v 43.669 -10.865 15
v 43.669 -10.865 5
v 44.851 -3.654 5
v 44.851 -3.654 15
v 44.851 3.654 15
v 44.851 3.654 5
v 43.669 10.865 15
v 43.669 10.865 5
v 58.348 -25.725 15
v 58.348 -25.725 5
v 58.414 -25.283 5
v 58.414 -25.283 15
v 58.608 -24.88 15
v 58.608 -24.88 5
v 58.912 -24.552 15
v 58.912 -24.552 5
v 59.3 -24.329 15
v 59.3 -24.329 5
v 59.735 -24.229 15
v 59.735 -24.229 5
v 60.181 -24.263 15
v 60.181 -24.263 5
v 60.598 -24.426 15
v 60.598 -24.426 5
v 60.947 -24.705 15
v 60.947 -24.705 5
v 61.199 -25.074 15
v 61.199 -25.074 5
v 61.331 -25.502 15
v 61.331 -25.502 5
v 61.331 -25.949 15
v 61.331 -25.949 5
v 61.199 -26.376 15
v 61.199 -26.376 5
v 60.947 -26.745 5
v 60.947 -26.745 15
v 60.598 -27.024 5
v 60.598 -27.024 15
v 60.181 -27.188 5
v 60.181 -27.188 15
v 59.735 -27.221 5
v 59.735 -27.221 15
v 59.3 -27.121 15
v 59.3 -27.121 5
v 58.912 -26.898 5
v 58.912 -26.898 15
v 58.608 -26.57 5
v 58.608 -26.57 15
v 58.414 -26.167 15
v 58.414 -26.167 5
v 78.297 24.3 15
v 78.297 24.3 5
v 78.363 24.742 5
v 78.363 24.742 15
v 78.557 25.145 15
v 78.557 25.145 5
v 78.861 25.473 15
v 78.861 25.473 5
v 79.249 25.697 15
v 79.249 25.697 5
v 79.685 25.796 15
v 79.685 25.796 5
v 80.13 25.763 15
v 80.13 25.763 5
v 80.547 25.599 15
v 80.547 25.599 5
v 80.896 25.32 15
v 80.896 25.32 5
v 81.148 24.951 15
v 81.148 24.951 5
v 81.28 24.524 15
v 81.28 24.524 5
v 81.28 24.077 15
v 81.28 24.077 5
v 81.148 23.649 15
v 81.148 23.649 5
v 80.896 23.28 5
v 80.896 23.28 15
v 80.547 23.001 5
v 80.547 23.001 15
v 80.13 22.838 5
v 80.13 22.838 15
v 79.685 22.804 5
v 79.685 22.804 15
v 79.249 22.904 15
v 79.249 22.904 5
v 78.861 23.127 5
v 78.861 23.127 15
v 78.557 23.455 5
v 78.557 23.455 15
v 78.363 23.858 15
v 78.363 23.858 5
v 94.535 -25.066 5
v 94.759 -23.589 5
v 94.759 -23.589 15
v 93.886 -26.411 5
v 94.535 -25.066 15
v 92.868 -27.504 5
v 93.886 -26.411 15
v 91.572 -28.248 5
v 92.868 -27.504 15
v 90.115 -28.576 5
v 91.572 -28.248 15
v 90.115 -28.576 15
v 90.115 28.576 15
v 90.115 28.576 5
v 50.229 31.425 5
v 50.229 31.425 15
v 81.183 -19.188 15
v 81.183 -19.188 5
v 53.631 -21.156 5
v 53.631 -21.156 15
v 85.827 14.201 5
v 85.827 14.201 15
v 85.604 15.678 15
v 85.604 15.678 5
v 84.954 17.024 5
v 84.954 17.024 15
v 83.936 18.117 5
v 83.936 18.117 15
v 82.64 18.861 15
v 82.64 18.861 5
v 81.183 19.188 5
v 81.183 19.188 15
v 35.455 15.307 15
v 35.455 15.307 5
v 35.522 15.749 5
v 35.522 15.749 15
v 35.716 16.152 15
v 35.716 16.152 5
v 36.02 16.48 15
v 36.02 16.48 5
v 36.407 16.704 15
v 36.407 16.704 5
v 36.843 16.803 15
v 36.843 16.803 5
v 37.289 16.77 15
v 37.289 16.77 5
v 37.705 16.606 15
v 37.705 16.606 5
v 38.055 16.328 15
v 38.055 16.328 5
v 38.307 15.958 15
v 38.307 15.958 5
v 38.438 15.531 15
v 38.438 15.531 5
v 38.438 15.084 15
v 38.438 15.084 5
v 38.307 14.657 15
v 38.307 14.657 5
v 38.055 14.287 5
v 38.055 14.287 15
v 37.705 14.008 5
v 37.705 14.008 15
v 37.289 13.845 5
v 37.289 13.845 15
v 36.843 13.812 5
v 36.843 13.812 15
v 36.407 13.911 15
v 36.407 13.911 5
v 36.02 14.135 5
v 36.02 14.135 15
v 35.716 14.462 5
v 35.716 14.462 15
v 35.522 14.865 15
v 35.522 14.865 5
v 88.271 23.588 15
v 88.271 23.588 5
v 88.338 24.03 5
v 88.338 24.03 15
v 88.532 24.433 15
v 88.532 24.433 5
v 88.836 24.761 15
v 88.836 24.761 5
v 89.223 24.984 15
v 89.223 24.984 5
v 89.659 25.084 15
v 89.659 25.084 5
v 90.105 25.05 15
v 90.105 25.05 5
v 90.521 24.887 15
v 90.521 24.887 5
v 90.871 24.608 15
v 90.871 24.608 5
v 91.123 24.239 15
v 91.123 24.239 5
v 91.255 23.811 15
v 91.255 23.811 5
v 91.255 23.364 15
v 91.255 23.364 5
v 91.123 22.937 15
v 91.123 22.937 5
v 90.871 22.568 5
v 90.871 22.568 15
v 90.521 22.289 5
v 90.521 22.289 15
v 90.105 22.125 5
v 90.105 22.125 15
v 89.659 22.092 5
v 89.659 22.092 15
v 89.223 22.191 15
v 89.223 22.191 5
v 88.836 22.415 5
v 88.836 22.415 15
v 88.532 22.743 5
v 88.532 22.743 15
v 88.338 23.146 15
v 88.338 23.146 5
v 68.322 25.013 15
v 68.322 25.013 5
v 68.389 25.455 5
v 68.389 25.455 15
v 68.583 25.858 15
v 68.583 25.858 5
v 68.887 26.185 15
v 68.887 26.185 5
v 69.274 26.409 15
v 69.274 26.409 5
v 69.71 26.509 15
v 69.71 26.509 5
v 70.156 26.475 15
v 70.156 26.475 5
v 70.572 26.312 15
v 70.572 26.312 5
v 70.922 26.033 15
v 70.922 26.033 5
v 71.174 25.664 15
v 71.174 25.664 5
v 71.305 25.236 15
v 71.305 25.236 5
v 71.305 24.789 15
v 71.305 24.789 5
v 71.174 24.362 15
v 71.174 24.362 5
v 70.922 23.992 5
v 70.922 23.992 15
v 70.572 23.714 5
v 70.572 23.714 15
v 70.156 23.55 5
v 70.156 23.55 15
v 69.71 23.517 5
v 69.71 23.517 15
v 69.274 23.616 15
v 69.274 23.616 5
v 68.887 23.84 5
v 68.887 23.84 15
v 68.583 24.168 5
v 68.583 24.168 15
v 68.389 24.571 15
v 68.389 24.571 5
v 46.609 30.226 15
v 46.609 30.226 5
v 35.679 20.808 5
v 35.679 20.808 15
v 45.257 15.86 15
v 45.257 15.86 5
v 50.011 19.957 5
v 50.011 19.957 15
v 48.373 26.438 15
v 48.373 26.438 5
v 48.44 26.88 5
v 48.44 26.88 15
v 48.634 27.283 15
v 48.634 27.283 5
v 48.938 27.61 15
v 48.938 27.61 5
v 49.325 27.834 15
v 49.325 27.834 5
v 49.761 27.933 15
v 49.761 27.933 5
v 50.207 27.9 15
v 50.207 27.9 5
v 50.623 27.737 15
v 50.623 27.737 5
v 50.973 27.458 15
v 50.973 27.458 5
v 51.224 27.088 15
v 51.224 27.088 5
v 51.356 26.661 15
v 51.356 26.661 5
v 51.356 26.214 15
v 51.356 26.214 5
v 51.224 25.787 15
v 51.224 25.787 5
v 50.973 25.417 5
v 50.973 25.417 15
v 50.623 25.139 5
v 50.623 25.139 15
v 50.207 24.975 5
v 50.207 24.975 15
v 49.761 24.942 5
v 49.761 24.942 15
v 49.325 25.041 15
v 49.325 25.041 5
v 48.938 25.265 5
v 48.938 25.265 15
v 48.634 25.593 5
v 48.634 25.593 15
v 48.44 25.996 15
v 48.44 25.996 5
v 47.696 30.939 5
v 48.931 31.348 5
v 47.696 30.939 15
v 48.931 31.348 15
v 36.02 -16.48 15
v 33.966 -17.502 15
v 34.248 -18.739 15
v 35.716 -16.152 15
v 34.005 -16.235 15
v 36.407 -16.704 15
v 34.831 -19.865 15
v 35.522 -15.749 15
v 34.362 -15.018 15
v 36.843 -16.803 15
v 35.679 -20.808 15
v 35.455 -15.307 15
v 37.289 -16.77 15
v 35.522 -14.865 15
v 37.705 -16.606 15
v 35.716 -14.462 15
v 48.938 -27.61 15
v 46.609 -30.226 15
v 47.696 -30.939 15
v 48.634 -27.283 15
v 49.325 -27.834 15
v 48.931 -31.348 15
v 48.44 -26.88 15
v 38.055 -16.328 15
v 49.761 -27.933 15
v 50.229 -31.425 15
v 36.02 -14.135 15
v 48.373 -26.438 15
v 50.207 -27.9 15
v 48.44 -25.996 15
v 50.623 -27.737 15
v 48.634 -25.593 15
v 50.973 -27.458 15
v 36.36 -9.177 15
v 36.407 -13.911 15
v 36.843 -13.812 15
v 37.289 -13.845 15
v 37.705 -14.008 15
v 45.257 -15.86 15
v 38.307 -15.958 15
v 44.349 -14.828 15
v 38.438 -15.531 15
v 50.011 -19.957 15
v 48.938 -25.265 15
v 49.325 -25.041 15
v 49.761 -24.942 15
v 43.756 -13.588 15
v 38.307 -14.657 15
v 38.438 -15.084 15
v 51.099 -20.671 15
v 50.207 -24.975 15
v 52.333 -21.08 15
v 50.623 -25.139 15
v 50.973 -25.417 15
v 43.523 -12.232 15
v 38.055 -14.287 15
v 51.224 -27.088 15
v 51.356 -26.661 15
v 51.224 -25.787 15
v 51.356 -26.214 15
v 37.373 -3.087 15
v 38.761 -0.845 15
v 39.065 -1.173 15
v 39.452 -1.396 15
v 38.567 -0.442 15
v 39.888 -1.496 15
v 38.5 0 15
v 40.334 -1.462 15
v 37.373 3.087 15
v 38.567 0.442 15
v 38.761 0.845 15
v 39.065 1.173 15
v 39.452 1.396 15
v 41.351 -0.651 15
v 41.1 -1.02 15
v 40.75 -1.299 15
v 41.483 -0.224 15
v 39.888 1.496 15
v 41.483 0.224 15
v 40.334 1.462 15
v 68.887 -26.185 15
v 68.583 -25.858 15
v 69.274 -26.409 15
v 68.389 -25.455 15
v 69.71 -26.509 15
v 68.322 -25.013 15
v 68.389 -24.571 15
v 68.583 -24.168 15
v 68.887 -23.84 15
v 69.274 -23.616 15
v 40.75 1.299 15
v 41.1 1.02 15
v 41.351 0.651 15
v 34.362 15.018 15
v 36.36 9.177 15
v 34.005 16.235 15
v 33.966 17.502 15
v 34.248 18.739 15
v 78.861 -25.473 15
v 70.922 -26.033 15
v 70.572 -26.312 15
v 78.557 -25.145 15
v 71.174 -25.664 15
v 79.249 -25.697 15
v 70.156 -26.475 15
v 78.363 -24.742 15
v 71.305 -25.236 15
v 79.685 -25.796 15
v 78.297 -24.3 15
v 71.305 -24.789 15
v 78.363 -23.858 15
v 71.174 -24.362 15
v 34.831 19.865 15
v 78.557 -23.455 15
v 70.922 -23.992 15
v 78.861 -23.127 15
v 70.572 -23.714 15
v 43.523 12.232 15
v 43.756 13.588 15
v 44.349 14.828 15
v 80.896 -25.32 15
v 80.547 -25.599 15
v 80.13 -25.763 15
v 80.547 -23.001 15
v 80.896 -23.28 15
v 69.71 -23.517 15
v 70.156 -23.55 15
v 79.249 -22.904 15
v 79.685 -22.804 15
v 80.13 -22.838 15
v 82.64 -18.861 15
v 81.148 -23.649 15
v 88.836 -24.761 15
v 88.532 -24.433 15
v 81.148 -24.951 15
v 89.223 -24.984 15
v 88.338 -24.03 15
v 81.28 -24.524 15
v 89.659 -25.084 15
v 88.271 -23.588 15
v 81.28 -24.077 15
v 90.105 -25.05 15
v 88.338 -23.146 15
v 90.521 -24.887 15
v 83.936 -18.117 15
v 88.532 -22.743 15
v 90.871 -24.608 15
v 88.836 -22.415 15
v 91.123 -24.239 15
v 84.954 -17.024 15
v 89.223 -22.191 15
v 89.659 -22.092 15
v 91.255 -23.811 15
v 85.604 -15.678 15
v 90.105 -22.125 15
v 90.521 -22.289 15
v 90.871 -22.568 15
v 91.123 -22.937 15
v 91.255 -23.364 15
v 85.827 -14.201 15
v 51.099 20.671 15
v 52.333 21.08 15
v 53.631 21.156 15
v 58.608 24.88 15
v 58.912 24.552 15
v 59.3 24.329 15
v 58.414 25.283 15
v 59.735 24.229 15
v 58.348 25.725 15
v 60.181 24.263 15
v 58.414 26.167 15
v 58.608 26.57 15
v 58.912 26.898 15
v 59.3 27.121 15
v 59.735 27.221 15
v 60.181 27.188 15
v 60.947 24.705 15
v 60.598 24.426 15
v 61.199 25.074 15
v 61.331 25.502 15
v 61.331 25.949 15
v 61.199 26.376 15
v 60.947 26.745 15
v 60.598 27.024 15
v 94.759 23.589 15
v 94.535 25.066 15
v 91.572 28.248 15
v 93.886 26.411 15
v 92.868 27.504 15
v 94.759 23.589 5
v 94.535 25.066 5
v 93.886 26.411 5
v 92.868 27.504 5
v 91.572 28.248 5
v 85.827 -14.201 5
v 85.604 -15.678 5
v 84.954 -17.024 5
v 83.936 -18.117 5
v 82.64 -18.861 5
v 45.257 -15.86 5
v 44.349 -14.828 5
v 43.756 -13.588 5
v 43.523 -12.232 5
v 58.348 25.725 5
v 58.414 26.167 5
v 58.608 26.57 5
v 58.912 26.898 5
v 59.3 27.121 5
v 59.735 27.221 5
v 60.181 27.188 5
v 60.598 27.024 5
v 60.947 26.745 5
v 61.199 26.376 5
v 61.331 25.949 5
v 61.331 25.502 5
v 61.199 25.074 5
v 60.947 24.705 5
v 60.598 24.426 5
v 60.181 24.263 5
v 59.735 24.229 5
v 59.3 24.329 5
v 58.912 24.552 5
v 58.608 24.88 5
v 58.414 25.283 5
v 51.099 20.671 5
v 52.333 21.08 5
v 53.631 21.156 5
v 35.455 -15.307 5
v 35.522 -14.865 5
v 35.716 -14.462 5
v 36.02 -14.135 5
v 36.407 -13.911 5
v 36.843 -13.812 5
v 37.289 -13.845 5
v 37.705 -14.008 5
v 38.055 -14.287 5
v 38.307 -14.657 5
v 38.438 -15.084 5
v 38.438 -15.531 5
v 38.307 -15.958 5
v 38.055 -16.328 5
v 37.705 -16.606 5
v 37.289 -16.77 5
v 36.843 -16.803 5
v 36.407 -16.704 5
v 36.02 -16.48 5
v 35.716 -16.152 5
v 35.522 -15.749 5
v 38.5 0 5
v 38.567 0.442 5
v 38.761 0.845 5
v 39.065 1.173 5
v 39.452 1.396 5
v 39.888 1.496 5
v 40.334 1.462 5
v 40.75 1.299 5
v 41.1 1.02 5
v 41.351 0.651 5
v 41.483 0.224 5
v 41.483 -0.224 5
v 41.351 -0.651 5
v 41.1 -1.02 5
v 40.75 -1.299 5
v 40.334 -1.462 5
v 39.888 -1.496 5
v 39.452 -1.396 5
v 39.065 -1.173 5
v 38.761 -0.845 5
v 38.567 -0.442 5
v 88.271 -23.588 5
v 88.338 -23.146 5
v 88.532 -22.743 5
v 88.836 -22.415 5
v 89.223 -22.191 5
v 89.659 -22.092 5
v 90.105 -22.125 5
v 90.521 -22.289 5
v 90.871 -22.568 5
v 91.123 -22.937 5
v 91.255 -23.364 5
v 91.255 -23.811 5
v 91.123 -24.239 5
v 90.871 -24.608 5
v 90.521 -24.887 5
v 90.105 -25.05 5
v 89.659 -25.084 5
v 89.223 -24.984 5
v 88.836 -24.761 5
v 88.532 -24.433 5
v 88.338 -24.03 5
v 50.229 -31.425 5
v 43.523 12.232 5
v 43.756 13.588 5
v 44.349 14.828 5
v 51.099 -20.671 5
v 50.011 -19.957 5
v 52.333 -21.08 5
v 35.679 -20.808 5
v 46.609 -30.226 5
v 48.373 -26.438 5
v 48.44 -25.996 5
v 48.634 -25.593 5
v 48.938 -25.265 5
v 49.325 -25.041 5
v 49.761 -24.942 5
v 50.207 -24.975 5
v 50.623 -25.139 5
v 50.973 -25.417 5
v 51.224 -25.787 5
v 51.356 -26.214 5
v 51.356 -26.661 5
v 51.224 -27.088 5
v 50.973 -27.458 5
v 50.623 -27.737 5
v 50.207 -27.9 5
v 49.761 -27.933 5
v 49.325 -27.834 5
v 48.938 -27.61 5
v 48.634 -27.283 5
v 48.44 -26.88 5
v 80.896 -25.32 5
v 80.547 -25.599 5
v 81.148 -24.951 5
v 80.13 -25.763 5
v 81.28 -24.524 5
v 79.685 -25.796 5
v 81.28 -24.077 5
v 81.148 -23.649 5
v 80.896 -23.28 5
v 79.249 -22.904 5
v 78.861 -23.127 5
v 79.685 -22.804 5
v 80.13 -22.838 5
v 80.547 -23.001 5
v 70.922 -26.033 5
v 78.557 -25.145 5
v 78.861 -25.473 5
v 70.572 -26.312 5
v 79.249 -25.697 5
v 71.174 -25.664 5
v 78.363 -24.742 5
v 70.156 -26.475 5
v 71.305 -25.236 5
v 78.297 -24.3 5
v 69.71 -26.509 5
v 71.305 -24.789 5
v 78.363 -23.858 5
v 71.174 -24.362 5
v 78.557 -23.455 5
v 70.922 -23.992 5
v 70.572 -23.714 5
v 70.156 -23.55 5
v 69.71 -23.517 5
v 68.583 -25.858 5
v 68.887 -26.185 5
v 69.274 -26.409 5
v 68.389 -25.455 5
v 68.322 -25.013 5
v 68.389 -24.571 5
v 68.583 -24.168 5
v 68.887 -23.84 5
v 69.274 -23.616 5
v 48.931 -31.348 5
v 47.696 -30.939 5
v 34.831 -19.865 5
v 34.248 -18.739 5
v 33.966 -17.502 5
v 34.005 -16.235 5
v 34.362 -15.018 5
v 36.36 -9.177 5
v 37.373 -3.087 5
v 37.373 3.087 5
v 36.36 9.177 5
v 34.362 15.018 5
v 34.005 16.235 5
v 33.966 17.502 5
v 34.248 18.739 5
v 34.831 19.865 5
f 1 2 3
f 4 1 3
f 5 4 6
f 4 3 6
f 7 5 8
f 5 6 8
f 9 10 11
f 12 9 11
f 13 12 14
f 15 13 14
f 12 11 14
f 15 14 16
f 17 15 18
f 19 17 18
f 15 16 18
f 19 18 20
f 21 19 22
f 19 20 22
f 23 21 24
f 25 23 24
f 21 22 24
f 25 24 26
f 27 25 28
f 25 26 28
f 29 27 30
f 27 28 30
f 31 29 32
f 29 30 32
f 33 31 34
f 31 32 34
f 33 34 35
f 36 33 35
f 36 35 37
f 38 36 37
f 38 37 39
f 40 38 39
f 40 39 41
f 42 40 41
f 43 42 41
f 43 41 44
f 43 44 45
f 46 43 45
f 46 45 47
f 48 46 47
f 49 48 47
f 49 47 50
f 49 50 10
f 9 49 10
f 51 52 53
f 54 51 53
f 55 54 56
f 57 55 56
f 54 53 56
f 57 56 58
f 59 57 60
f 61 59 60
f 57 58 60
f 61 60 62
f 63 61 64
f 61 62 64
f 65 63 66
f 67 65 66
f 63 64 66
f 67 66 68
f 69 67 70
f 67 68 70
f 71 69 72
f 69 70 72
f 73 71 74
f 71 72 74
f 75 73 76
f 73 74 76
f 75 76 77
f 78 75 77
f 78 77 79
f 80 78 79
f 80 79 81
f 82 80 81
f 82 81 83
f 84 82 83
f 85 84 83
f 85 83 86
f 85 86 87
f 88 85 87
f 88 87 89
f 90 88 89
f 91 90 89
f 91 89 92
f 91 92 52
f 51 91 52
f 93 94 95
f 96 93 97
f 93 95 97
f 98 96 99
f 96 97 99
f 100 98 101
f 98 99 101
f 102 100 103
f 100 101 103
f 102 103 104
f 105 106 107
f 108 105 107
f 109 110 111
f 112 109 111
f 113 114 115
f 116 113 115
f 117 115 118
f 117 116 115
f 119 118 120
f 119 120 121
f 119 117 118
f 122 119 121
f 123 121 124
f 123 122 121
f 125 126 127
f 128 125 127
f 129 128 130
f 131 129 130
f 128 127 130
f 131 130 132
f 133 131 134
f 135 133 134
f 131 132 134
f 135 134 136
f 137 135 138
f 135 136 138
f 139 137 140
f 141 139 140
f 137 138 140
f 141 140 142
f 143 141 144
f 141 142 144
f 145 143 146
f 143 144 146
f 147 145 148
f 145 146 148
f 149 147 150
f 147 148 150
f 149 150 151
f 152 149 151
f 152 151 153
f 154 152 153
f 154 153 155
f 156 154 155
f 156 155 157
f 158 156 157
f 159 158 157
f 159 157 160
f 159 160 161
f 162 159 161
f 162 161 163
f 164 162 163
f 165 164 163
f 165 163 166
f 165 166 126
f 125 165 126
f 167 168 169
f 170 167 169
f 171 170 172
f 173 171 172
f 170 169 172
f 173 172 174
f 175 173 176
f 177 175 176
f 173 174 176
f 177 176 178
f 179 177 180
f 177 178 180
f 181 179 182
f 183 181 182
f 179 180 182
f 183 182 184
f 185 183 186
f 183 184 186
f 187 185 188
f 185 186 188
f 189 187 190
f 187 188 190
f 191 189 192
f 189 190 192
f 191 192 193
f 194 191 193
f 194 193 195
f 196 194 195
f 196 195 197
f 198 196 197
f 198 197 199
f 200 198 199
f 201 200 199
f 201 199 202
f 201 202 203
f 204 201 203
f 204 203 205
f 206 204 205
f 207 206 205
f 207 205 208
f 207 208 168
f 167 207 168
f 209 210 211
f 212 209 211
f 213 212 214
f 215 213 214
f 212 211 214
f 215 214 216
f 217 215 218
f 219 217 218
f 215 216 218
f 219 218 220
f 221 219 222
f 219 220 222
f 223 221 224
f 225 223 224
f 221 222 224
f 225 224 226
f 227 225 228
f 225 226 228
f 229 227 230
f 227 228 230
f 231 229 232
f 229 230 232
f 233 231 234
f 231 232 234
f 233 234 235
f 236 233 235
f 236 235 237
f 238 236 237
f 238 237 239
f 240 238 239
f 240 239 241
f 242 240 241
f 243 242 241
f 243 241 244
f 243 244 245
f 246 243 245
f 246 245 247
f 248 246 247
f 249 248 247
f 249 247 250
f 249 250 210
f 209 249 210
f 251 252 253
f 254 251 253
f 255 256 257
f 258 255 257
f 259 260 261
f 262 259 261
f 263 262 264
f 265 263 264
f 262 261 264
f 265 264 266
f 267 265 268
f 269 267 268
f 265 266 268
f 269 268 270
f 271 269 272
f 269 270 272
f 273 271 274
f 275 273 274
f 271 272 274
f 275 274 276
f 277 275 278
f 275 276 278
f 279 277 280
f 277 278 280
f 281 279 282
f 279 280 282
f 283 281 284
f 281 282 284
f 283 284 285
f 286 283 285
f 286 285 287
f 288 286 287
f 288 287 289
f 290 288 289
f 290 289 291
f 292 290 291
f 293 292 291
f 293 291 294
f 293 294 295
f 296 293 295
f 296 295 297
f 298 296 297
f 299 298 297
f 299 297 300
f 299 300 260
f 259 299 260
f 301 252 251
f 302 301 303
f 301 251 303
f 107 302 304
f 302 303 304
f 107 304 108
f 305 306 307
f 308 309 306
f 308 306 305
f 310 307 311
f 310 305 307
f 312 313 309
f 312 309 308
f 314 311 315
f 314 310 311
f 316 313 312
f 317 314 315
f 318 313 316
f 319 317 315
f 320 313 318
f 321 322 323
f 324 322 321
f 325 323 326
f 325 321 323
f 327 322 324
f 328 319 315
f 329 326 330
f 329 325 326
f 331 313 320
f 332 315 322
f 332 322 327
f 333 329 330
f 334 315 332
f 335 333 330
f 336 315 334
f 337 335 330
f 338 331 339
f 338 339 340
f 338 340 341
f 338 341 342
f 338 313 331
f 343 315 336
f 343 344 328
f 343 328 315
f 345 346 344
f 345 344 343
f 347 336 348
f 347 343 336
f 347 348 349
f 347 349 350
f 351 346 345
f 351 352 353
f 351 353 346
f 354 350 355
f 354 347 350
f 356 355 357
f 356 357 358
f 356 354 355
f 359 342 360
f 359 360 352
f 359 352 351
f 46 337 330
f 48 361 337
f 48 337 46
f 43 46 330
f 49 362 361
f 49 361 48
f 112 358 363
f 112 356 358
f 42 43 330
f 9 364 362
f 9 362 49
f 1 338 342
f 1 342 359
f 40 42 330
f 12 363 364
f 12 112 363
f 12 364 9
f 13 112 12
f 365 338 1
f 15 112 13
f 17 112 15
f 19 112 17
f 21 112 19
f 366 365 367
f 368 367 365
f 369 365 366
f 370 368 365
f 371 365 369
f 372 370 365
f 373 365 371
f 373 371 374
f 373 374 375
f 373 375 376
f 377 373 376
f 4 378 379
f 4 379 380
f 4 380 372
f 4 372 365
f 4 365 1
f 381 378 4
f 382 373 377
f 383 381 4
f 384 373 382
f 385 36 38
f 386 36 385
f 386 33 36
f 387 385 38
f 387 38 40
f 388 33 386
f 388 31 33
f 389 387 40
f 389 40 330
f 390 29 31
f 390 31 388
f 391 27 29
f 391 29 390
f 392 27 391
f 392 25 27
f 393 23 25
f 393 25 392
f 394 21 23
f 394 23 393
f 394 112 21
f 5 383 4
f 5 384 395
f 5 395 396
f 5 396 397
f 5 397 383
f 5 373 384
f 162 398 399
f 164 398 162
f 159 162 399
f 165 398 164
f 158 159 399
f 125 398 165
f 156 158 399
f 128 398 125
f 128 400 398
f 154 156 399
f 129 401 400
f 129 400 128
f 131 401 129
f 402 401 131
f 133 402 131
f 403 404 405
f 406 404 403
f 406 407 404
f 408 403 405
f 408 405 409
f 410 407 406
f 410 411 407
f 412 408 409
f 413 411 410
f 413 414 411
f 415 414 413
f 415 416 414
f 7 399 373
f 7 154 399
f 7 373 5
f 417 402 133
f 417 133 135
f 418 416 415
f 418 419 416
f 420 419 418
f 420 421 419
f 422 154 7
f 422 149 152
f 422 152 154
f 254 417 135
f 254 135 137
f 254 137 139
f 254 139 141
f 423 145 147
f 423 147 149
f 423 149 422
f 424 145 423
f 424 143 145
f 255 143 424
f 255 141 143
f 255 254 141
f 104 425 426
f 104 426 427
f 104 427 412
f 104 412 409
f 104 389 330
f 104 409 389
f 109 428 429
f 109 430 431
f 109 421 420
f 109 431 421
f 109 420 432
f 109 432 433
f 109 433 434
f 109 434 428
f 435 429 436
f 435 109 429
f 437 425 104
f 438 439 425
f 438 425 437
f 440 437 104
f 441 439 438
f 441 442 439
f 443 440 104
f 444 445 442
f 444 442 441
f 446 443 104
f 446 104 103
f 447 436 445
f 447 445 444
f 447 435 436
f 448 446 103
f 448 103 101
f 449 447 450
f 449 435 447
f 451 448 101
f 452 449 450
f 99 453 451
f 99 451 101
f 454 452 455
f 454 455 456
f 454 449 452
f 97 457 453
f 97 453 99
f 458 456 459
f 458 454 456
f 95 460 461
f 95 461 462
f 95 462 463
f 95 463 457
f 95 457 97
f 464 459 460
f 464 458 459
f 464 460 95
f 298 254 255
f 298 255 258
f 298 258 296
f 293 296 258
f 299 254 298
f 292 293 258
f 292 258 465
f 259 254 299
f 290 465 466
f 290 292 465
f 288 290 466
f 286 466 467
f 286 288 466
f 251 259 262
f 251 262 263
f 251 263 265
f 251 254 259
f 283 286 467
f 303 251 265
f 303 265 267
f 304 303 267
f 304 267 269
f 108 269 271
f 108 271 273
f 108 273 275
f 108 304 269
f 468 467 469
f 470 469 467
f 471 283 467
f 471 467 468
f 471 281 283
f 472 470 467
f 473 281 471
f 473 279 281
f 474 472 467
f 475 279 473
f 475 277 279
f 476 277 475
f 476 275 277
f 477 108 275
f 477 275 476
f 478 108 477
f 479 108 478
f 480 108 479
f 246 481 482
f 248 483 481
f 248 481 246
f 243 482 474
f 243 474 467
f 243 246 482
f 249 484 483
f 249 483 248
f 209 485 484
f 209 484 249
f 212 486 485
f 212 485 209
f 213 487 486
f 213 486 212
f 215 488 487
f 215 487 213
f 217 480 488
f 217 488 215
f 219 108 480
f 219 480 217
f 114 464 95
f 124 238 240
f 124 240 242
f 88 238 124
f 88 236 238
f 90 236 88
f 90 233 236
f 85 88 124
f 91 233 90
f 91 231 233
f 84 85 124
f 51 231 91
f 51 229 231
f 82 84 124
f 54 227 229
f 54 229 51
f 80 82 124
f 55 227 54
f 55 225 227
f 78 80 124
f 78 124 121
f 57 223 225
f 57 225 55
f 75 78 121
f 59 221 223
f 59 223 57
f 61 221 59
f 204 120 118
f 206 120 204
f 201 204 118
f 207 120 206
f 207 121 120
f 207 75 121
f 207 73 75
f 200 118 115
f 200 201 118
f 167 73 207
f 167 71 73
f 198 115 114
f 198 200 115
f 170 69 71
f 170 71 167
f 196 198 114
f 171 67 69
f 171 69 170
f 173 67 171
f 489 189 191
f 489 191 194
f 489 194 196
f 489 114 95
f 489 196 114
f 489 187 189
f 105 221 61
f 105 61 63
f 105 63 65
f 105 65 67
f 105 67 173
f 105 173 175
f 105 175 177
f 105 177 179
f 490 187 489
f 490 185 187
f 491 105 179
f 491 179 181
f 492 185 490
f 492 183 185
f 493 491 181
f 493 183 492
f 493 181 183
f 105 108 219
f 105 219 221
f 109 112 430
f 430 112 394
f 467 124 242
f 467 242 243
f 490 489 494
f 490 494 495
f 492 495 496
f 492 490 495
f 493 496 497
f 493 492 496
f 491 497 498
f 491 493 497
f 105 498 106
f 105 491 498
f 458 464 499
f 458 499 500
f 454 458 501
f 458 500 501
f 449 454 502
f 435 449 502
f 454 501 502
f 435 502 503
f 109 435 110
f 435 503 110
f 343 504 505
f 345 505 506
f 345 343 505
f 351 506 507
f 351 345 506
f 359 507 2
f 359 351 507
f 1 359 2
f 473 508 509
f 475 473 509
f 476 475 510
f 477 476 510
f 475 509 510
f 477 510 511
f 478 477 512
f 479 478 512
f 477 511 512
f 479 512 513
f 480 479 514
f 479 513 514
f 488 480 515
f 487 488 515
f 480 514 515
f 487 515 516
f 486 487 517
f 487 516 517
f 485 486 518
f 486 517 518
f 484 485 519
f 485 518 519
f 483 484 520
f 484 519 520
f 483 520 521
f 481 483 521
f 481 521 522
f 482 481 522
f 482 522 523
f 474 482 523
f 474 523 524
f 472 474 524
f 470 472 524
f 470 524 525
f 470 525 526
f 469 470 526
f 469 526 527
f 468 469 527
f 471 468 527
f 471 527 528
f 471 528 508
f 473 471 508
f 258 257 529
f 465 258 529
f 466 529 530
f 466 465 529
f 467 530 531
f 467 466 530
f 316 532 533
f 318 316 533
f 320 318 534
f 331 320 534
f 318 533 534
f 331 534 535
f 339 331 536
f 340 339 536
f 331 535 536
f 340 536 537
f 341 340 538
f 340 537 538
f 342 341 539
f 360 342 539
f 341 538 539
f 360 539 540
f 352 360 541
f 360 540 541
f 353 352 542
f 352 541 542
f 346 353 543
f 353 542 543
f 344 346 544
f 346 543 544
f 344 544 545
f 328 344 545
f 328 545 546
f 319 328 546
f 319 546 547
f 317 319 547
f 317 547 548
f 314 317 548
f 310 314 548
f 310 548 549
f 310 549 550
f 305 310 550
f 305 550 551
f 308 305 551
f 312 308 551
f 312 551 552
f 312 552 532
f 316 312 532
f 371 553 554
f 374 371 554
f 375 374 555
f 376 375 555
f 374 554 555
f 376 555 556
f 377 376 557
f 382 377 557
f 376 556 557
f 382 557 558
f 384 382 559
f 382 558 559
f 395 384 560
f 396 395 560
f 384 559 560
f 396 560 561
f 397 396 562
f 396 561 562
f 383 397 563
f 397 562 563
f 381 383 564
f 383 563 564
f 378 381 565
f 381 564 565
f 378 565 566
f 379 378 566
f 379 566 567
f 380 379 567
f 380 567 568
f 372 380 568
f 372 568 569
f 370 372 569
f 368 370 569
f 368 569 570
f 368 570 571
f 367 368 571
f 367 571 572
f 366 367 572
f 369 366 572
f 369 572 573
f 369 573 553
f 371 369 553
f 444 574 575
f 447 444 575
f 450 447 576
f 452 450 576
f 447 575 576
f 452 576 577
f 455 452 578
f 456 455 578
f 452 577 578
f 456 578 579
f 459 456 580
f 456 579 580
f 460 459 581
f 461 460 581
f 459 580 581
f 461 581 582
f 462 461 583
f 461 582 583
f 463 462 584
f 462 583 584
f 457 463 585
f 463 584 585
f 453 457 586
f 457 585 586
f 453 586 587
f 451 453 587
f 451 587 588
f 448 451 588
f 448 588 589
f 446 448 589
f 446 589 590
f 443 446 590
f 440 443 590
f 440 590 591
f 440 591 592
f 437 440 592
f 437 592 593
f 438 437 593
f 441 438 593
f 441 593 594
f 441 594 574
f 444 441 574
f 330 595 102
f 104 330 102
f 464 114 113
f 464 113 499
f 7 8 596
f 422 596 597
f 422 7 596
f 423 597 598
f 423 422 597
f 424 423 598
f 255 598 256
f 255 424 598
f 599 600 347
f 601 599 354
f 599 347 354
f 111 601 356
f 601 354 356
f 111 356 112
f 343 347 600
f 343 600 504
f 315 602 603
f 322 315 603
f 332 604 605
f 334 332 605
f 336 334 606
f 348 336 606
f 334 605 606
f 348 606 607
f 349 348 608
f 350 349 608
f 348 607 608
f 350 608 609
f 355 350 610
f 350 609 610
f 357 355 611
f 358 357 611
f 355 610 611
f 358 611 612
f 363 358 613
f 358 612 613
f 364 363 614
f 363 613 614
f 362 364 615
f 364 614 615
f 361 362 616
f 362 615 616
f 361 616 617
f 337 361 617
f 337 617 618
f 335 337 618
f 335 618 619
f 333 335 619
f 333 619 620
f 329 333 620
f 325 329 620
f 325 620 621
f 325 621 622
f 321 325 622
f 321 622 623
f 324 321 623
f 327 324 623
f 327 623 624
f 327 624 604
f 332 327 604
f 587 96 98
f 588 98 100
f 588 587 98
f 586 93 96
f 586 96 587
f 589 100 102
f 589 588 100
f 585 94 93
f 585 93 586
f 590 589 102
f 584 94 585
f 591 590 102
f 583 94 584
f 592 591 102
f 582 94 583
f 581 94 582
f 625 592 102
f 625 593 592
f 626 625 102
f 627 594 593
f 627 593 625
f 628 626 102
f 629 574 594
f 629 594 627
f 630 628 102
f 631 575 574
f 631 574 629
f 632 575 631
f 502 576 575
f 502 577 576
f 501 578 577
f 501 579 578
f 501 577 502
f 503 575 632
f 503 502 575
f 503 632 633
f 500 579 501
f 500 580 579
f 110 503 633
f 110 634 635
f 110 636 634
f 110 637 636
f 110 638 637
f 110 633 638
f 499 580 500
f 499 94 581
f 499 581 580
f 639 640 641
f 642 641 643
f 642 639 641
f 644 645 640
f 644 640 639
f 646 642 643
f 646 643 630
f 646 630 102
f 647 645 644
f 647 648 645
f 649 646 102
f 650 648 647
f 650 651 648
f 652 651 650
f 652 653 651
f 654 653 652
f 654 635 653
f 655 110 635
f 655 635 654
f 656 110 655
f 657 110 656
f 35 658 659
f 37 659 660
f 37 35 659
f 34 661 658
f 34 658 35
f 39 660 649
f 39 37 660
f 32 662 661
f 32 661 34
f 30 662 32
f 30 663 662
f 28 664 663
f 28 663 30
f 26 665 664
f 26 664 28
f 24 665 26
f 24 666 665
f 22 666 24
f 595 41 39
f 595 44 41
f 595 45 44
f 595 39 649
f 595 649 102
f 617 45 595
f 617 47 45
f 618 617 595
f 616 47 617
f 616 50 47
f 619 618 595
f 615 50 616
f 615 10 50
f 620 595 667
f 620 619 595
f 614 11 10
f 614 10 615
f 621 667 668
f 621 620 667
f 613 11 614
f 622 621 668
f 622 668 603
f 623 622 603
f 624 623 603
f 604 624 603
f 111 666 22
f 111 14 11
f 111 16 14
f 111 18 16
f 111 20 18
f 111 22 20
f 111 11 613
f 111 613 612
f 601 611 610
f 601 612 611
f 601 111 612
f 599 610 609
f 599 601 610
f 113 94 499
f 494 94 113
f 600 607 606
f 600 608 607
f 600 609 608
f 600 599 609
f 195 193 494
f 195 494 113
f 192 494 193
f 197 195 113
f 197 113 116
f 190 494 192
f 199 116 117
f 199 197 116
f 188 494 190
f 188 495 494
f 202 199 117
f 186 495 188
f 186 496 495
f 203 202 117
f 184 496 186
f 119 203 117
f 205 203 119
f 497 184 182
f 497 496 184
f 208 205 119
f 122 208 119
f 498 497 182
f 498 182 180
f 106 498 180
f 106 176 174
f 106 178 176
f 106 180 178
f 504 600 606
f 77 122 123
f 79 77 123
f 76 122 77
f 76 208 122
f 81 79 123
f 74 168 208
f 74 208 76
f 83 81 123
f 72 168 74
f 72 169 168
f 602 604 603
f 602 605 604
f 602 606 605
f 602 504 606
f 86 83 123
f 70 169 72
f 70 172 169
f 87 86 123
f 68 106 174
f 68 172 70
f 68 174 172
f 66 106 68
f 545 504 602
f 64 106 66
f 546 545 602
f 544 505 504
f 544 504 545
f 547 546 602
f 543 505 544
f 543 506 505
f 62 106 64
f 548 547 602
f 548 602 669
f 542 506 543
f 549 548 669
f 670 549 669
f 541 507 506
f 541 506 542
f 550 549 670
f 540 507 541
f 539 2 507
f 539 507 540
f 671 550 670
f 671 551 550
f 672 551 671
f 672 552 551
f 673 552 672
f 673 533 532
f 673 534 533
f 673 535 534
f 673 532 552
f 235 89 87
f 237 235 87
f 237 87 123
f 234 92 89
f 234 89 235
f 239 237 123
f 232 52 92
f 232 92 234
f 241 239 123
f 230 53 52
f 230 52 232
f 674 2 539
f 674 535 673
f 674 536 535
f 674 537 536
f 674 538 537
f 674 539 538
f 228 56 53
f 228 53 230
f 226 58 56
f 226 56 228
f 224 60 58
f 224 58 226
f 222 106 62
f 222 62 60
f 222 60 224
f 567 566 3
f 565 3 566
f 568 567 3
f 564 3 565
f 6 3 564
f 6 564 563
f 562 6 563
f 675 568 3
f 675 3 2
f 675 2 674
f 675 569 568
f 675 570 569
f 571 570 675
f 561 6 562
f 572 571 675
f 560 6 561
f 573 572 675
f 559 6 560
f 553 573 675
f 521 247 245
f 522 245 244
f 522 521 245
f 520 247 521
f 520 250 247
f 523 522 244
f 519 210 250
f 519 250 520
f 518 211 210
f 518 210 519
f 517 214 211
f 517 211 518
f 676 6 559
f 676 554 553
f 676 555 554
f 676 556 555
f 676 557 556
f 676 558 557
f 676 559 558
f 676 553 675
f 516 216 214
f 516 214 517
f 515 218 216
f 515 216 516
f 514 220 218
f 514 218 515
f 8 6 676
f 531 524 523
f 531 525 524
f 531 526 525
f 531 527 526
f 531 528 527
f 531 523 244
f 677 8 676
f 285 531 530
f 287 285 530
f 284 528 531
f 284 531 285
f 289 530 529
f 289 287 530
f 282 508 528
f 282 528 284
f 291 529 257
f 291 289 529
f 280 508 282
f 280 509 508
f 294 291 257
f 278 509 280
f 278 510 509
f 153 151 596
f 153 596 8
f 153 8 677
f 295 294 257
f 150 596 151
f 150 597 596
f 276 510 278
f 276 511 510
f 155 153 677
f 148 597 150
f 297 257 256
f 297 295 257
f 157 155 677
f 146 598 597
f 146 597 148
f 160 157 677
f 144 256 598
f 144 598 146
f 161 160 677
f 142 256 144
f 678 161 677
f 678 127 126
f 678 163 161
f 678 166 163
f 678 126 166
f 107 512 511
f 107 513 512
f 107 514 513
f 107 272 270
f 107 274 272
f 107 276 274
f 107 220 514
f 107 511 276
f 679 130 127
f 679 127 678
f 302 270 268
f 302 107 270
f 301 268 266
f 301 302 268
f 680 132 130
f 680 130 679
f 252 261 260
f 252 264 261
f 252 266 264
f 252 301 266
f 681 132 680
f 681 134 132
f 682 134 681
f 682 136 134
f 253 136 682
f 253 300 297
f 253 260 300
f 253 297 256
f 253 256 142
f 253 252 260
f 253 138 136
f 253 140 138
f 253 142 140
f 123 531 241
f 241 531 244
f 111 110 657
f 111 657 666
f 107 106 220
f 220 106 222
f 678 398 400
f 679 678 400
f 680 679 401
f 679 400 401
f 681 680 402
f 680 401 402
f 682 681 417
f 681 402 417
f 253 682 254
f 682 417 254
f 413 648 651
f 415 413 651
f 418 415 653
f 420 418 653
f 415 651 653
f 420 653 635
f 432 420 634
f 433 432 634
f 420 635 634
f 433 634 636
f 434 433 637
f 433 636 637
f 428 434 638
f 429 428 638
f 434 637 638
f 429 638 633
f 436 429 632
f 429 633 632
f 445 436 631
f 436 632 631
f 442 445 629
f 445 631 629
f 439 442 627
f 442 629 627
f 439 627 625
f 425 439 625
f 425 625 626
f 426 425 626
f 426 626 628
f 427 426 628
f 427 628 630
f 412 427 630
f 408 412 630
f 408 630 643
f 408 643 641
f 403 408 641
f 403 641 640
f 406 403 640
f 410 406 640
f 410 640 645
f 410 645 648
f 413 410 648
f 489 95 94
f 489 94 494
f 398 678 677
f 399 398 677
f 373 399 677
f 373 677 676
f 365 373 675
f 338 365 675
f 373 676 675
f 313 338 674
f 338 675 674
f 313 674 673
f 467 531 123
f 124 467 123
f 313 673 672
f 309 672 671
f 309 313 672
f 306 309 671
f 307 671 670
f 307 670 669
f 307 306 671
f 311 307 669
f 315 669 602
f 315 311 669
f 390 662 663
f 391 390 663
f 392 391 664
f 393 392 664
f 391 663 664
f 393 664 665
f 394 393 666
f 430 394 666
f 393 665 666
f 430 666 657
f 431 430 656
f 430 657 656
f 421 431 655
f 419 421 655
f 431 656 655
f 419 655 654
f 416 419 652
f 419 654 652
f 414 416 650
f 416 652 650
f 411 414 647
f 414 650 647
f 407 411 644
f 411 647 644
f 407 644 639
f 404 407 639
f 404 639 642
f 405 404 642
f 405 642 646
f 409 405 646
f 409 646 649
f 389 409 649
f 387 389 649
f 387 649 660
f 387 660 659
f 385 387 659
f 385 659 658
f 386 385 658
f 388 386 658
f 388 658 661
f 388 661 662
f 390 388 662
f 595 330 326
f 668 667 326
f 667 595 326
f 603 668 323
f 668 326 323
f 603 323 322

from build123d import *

# Parameters (mm, degrees)
EXTRUDE_1_DEPTH     = 15
FILLET_1_R          = 5
FILLET_2_R          = 5
FILLET_3_R          = 5
FILLET_4_R          = 5
FILLET_5_R          = 5
FILLET_6_R          = 5
FILLET_7_R          = 5
FILLET_8_R          = 5
FILLET_9_R          = 5
FILLET_10_R         = 5
FILLET_11_R         = 5
FILLET_12_R         = 5
FILLET_13_R         = 5
FILLET_14_R         = 5
FILLET_15_R         = 5
FILLET_16_R         = 5
SKETCH_5_R          = 1.5
CUT_EXTRUDE_1_DEPTH = 15
CUT_EXTRUDE_START   = -15
SKETCH_6_R          = 1.5
CUT_EXTRUDE_5_DEPTH = 15
EXTRUDE_2_DEPTH     = 15
FILLET_17_R         = 5
FILLET_18_R         = 5
FILLET_19_R         = 5
FILLET_20_R         = 5
SKETCH_8_W          = 96.520141499
SKETCH_8_H          = 72.316132992
CUT_EXTRUDE_6_DEPTH = 5


with BuildPart() as part:
    # 草图3 → 凸台-拉伸1 (new body)
    with BuildSketch(Plane.XY):
        with BuildLine():
            Line((101.99145665, -27.727634828), (114.18506552, -15.283623844))
            ThreePointArc((114.18506552, -15.283623844), (110, 0), (114.18506552, 15.283623844))
            Line((114.18506552, 15.283623844), (101.99145665, 27.727634828))
            Line((101.99145665, 27.727634828), (48.171786379, 31.57189699))
            Line((48.171786379, 31.57189699), (32.743622368, 18.278544642))
            ThreePointArc((32.743622368, 18.278544642), (37.5, 0), (32.743622368, -18.278544642))
            Line((32.743622368, -18.278544642), (48.171786379, -31.57189699))
            Line((48.171786379, -31.57189699), (101.99145665, -27.727634828))
        make_face()
        with BuildLine():
            ThreePointArc((42.839131819, -13.777110909), (45, 0), (42.839131819, 13.777110909))
            Line((42.839131819, 13.777110909), (51.574083604, 21.303398011))
            Line((51.574083604, 21.303398011), (97.500283316, 18.022955175))
            Line((97.500283316, 18.022955175), (106.212331228, 9.132000819))
            ThreePointArc((106.212331228, 9.132000819), (105, 0), (106.212331228, -9.132000819))
            Line((106.212331228, -9.132000819), (97.500283316, -18.022955175))
            Line((97.500283316, -18.022955175), (51.574083604, -21.303398011))
            Line((51.574083604, -21.303398011), (42.839131819, -13.777110909))
        make_face(mode=Mode.SUBTRACT)
    extrude(amount=EXTRUDE_1_DEPTH)

    # 圆角1
    fillet_1_edges = [part.edges().sort_by_distance(p)[0] for p in [
        (101.99145665, 27.727634828, 7.5),
    ]]
    fillet(fillet_1_edges, radius=FILLET_1_R)

    # 圆角2
    fillet_2_edges = [part.edges().sort_by_distance(p)[0] for p in [
        (114.18506552, 15.283623844, 7.5),
    ]]
    fillet(fillet_2_edges, radius=FILLET_2_R)

    # 圆角3
    fillet_3_edges = [part.edges().sort_by_distance(p)[0] for p in [
        (114.18506552, -15.283623844, 7.5),
    ]]
    fillet(fillet_3_edges, radius=FILLET_3_R)

    # 圆角4
    fillet_4_edges = [part.edges().sort_by_distance(p)[0] for p in [
        (101.99145665, -27.727634828, 7.5),
    ]]
    fillet(fillet_4_edges, radius=FILLET_4_R)

    # 圆角5
    fillet_5_edges = [part.edges().sort_by_distance(p)[0] for p in [
        (48.171786379, -31.57189699, 7.5),
    ]]
    fillet(fillet_5_edges, radius=FILLET_5_R)

    # 圆角6
    fillet_6_edges = [part.edges().sort_by_distance(p)[0] for p in [
        (48.171786379, 31.57189699, 7.5),
    ]]
    fillet(fillet_6_edges, radius=FILLET_6_R)

    # 圆角7
    fillet_7_edges = [part.edges().sort_by_distance(p)[0] for p in [
        (32.743622368, -18.278544642, 7.5),
    ]]
    fillet(fillet_7_edges, radius=FILLET_7_R)

    # 圆角8
    fillet_8_edges = [part.edges().sort_by_distance(p)[0] for p in [
        (32.743622368, 18.278544642, 7.5),
    ]]
    fillet(fillet_8_edges, radius=FILLET_8_R)

    # 圆角9
    fillet_9_edges = [part.edges().sort_by_distance(p)[0] for p in [
        (97.500283316, -18.022955175, 7.5),
    ]]
    fillet(fillet_9_edges, radius=FILLET_9_R)

    # 圆角10
    fillet_10_edges = [part.edges().sort_by_distance(p)[0] for p in [
        (106.212331228, -9.132000819, 7.5),
    ]]
    fillet(fillet_10_edges, radius=FILLET_10_R)

    # 圆角11
    fillet_11_edges = [part.edges().sort_by_distance(p)[0] for p in [
        (106.212331228, 9.132000819, 7.5),
    ]]
    fillet(fillet_11_edges, radius=FILLET_11_R)

    # 圆角12
    fillet_12_edges = [part.edges().sort_by_distance(p)[0] for p in [
        (97.500283316, 18.022955175, 7.5),
    ]]
    fillet(fillet_12_edges, radius=FILLET_12_R)

    # 圆角13
    fillet_13_edges = [part.edges().sort_by_distance(p)[0] for p in [
        (51.574083604, -21.303398011, 7.5),
    ]]
    fillet(fillet_13_edges, radius=FILLET_13_R)

    # 圆角14
    fillet_14_edges = [part.edges().sort_by_distance(p)[0] for p in [
        (42.839131819, -13.777110909, 7.5),
    ]]
    fillet(fillet_14_edges, radius=FILLET_14_R)

    # 圆角15
    fillet_15_edges = [part.edges().sort_by_distance(p)[0] for p in [
        (42.839131819, 13.777110909, 7.5),
    ]]
    fillet(fillet_15_edges, radius=FILLET_15_R)

    # 圆角16
    fillet_16_edges = [part.edges().sort_by_distance(p)[0] for p in [
        (51.574083604, 21.303398011, 7.5),
    ]]
    fillet(fillet_16_edges, radius=FILLET_16_R)

    # 草图5 → 切除-拉伸1 (cut)
    with BuildSketch(Plane(origin=(0, 0, 0), x_dir=(-1, 0, 0), z_dir=(0, 0, -1))):
        with Locations((-36.9551813, 15.307337295)):
            Circle(SKETCH_5_R)
        with Locations((-40, 0)):
            Circle(SKETCH_5_R)
        with Locations((-36.9551813, -15.307337295)):
            Circle(SKETCH_5_R)
        with Locations((-49.872934992, -26.437647501)):
            Circle(SKETCH_5_R)
        with Locations((-49.872934992, 26.437647501)):
            Circle(SKETCH_5_R)
        with Locations((-99.745869983, 22.875295001)):
            Circle(SKETCH_5_R)
        with Locations((-99.745869983, -22.875295001)):
            Circle(SKETCH_5_R)
        with Locations((-109.973915193, 12.437211552)):
            Circle(SKETCH_5_R)
        with Locations((-107.5, 0)):
            Circle(SKETCH_5_R)
        with Locations((-109.973915193, -12.437211552)):
            Circle(SKETCH_5_R)
        with Locations((-59.84752199, 25.725177001)):
            Circle(SKETCH_5_R)
        with Locations((-69.822108988, 25.012706501)):
            Circle(SKETCH_5_R)
        with Locations((-79.796695986, 24.300236001)):
            Circle(SKETCH_5_R)
        with Locations((-89.771282985, 23.587765501)):
            Circle(SKETCH_5_R)
        with Locations((-89.771282985, -23.587765501)):
            Circle(SKETCH_5_R)
        with Locations((-79.796695986, -24.300236001)):
            Circle(SKETCH_5_R)
        with Locations((-69.822108988, -25.012706501)):
            Circle(SKETCH_5_R)
        with Locations((-59.84752199, -25.725177001)):
            Circle(SKETCH_5_R)
    extrude(amount=-CUT_EXTRUDE_1_DEPTH, mode=Mode.SUBTRACT)

    # 草图6 → 切除-拉伸5 (cut)
    # profile 1 of 5: a face of its own
    with BuildSketch(Plane.XY.offset(15).offset(CUT_EXTRUDE_START)):
        with BuildLine():
            ThreePointArc((103.31715251, 26.374715112), (101.845820167, 27.412938577), (100.102105233, 27.8625885))
            Line((100.102105233, 27.8625885), (100.102105233, 24.332379915))
            ThreePointArc((100.102105233, 24.332379915), (100.925775249, 23.801482651), (101.245869983, 22.875295001))
            ThreePointArc((101.245869983, 22.875295001), (100.925775249, 21.949107351), (100.102105233, 21.418210087))
            Line((100.102105233, 21.418210087), (100.102105233, 15.367703489))
            Line((100.102105233, 15.367703489), (104.297377986, 11.086278624))
            ThreePointArc((104.297377986, 11.086278624), (105.514152308, 9.027175008), (105.635333526, 6.638501199))
            ThreePointArc((105.635333526, 6.638501199), (105, 0), (105.635333526, -6.638501199))
            ThreePointArc((105.635333526, -6.638501199), (105.514152308, -9.027175008), (104.297377986, -11.086278624))
            Line((104.297377986, -11.086278624), (100.102105233, -15.367703489))
            Line((100.102105233, -15.367703489), (100.102105233, -21.418210087))
            ThreePointArc((100.102105233, -21.418210087), (100.925775249, -21.949107351), (101.245869983, -22.875295001))
            ThreePointArc((101.245869983, -22.875295001), (100.925775249, -23.801482651), (100.102105233, -24.332379915))
            Line((100.102105233, -24.332379915), (100.102105233, -27.8625885))
            ThreePointArc((100.102105233, -27.8625885), (101.845820167, -27.412938577), (103.31715251, -26.374715112))
            Line((103.31715251, -26.374715112), (111.655402821, -17.865234485))
            ThreePointArc((111.655402821, -17.865234485), (113.00675492, -15.241981218), (112.643531681, -12.313555178))
            ThreePointArc((112.643531681, -12.313555178), (110, 0), (112.643531681, 12.313555178))
            ThreePointArc((112.643531681, 12.313555178), (113.00675492, 15.241981218), (111.655402821, 17.865234485))
            Line((111.655402821, 17.865234485), (103.31715251, 26.374715112))
        make_face()
        with Locations((109.973915193, -12.437211552)):
            Circle(SKETCH_6_R, mode=Mode.SUBTRACT)
        with Locations((107.5, 0)):
            Circle(SKETCH_6_R, mode=Mode.SUBTRACT)
        with Locations((109.973915193, 12.437211552)):
            Circle(SKETCH_6_R, mode=Mode.SUBTRACT)
    # profile 2 of 5: a face of its own
    with BuildSketch(Plane.XY.offset(15).offset(CUT_EXTRUDE_START)):
        with BuildLine():
            Line((100.102105233, -21.418210087), (100.102105233, -15.367703489))
            Line((100.102105233, -15.367703489), (98.825979176, -16.670035459))
            ThreePointArc((98.825979176, -16.670035459), (97.354646834, -17.708258924), (95.610931899, -18.157908847))
            Line((95.610931899, -18.157908847), (94.758576484, -18.218791377))
            Line((94.758576484, -18.218791377), (94.758576484, -23.231530251))
            Line((94.758576484, -23.231530251), (98.249681933, -22.982165576))
            ThreePointArc((98.249681933, -22.982165576), (98.778211836, -21.729154647), (100.102105233, -21.418210087))
        make_face()
    # profile 3 of 5: a face of its own
    with BuildSketch(Plane.XY.offset(15).offset(CUT_EXTRUDE_START)):
        with BuildLine():
            Line((94.758576484, -28.244269125), (100.102105233, -27.8625885))
            Line((100.102105233, -27.8625885), (100.102105233, -24.332379915))
            ThreePointArc((100.102105233, -24.332379915), (98.862330065, -24.087465457), (98.249681933, -22.982165576))
            Line((98.249681933, -22.982165576), (94.758576484, -23.231530251))
            Line((94.758576484, -23.231530251), (94.758576484, -28.244269125))
        make_face()
    # profile 4 of 5: a face of its own
    with BuildSketch(Plane.XY.offset(15).offset(CUT_EXTRUDE_START)):
        with BuildLine():
            Line((100.102105233, 15.367703489), (100.102105233, 21.418210087))
            ThreePointArc((100.102105233, 21.418210087), (98.778211836, 21.729154647), (98.249681933, 22.982165576))
            Line((98.249681933, 22.982165576), (94.758576484, 23.231530251))
            Line((94.758576484, 23.231530251), (94.758576484, 18.218791377))
            Line((94.758576484, 18.218791377), (95.610931899, 18.157908847))
            ThreePointArc((95.610931899, 18.157908847), (97.354646834, 17.708258924), (98.825979176, 16.670035459))
            Line((98.825979176, 16.670035459), (100.102105233, 15.367703489))
        make_face()
    # profile 5 of 5: a face of its own
    with BuildSketch(Plane.XY.offset(15).offset(CUT_EXTRUDE_START)):
        with BuildLine():
            Line((100.102105233, 24.332379915), (100.102105233, 27.8625885))
            Line((100.102105233, 27.8625885), (94.758576484, 28.244269125))
            Line((94.758576484, 28.244269125), (94.758576484, 23.231530251))
            Line((94.758576484, 23.231530251), (98.249681933, 22.982165576))
            ThreePointArc((98.249681933, 22.982165576), (98.862330065, 24.087465457), (100.102105233, 24.332379915))
        make_face()
    extrude(amount=CUT_EXTRUDE_5_DEPTH, mode=Mode.SUBTRACT)

    # 草图7 → 凸台-拉伸2 (add)
    with BuildSketch(Plane.XY.offset(15)):
        Polygon((94.758576484, -18.218791377), (94.758576484, 18.218791377), (85.826771952, 18.856777415), (85.826771952, -18.856777415), align=None)
    extrude(amount=-EXTRUDE_2_DEPTH)

    # 圆角17
    fillet_17_edges = [part.edges().sort_by_distance(p)[0] for p in [
        (94.758576484, 28.244269125, 7.5),
    ]]
    fillet(fillet_17_edges, radius=FILLET_17_R)

    # 圆角18
    fillet_18_edges = [part.edges().sort_by_distance(p)[0] for p in [
        (94.758576484, -28.244269125, 7.5),
    ]]
    fillet(fillet_18_edges, radius=FILLET_18_R)

    # 圆角19
    fillet_19_edges = [part.edges().sort_by_distance(p)[0] for p in [
        (85.826771952, 18.856777415, 7.5),
    ]]
    fillet(fillet_19_edges, radius=FILLET_19_R)

    # 圆角20
    fillet_20_edges = [part.edges().sort_by_distance(p)[0] for p in [
        (85.826771952, -18.856777415, 7.5),
    ]]
    fillet(fillet_20_edges, radius=FILLET_20_R)

    # 草图8 → 切除-拉伸6 (cut)
    with BuildSketch(Plane(origin=(0, 0, 0), x_dir=(-1, 0, 0), z_dir=(0, 0, -1))):
        with Locations((-67.250576804, -3.787424314)):
            Rectangle(SKETCH_8_W, SKETCH_8_H)
    extrude(amount=-CUT_EXTRUDE_6_DEPTH, mode=Mode.SUBTRACT)


solid = part.part
